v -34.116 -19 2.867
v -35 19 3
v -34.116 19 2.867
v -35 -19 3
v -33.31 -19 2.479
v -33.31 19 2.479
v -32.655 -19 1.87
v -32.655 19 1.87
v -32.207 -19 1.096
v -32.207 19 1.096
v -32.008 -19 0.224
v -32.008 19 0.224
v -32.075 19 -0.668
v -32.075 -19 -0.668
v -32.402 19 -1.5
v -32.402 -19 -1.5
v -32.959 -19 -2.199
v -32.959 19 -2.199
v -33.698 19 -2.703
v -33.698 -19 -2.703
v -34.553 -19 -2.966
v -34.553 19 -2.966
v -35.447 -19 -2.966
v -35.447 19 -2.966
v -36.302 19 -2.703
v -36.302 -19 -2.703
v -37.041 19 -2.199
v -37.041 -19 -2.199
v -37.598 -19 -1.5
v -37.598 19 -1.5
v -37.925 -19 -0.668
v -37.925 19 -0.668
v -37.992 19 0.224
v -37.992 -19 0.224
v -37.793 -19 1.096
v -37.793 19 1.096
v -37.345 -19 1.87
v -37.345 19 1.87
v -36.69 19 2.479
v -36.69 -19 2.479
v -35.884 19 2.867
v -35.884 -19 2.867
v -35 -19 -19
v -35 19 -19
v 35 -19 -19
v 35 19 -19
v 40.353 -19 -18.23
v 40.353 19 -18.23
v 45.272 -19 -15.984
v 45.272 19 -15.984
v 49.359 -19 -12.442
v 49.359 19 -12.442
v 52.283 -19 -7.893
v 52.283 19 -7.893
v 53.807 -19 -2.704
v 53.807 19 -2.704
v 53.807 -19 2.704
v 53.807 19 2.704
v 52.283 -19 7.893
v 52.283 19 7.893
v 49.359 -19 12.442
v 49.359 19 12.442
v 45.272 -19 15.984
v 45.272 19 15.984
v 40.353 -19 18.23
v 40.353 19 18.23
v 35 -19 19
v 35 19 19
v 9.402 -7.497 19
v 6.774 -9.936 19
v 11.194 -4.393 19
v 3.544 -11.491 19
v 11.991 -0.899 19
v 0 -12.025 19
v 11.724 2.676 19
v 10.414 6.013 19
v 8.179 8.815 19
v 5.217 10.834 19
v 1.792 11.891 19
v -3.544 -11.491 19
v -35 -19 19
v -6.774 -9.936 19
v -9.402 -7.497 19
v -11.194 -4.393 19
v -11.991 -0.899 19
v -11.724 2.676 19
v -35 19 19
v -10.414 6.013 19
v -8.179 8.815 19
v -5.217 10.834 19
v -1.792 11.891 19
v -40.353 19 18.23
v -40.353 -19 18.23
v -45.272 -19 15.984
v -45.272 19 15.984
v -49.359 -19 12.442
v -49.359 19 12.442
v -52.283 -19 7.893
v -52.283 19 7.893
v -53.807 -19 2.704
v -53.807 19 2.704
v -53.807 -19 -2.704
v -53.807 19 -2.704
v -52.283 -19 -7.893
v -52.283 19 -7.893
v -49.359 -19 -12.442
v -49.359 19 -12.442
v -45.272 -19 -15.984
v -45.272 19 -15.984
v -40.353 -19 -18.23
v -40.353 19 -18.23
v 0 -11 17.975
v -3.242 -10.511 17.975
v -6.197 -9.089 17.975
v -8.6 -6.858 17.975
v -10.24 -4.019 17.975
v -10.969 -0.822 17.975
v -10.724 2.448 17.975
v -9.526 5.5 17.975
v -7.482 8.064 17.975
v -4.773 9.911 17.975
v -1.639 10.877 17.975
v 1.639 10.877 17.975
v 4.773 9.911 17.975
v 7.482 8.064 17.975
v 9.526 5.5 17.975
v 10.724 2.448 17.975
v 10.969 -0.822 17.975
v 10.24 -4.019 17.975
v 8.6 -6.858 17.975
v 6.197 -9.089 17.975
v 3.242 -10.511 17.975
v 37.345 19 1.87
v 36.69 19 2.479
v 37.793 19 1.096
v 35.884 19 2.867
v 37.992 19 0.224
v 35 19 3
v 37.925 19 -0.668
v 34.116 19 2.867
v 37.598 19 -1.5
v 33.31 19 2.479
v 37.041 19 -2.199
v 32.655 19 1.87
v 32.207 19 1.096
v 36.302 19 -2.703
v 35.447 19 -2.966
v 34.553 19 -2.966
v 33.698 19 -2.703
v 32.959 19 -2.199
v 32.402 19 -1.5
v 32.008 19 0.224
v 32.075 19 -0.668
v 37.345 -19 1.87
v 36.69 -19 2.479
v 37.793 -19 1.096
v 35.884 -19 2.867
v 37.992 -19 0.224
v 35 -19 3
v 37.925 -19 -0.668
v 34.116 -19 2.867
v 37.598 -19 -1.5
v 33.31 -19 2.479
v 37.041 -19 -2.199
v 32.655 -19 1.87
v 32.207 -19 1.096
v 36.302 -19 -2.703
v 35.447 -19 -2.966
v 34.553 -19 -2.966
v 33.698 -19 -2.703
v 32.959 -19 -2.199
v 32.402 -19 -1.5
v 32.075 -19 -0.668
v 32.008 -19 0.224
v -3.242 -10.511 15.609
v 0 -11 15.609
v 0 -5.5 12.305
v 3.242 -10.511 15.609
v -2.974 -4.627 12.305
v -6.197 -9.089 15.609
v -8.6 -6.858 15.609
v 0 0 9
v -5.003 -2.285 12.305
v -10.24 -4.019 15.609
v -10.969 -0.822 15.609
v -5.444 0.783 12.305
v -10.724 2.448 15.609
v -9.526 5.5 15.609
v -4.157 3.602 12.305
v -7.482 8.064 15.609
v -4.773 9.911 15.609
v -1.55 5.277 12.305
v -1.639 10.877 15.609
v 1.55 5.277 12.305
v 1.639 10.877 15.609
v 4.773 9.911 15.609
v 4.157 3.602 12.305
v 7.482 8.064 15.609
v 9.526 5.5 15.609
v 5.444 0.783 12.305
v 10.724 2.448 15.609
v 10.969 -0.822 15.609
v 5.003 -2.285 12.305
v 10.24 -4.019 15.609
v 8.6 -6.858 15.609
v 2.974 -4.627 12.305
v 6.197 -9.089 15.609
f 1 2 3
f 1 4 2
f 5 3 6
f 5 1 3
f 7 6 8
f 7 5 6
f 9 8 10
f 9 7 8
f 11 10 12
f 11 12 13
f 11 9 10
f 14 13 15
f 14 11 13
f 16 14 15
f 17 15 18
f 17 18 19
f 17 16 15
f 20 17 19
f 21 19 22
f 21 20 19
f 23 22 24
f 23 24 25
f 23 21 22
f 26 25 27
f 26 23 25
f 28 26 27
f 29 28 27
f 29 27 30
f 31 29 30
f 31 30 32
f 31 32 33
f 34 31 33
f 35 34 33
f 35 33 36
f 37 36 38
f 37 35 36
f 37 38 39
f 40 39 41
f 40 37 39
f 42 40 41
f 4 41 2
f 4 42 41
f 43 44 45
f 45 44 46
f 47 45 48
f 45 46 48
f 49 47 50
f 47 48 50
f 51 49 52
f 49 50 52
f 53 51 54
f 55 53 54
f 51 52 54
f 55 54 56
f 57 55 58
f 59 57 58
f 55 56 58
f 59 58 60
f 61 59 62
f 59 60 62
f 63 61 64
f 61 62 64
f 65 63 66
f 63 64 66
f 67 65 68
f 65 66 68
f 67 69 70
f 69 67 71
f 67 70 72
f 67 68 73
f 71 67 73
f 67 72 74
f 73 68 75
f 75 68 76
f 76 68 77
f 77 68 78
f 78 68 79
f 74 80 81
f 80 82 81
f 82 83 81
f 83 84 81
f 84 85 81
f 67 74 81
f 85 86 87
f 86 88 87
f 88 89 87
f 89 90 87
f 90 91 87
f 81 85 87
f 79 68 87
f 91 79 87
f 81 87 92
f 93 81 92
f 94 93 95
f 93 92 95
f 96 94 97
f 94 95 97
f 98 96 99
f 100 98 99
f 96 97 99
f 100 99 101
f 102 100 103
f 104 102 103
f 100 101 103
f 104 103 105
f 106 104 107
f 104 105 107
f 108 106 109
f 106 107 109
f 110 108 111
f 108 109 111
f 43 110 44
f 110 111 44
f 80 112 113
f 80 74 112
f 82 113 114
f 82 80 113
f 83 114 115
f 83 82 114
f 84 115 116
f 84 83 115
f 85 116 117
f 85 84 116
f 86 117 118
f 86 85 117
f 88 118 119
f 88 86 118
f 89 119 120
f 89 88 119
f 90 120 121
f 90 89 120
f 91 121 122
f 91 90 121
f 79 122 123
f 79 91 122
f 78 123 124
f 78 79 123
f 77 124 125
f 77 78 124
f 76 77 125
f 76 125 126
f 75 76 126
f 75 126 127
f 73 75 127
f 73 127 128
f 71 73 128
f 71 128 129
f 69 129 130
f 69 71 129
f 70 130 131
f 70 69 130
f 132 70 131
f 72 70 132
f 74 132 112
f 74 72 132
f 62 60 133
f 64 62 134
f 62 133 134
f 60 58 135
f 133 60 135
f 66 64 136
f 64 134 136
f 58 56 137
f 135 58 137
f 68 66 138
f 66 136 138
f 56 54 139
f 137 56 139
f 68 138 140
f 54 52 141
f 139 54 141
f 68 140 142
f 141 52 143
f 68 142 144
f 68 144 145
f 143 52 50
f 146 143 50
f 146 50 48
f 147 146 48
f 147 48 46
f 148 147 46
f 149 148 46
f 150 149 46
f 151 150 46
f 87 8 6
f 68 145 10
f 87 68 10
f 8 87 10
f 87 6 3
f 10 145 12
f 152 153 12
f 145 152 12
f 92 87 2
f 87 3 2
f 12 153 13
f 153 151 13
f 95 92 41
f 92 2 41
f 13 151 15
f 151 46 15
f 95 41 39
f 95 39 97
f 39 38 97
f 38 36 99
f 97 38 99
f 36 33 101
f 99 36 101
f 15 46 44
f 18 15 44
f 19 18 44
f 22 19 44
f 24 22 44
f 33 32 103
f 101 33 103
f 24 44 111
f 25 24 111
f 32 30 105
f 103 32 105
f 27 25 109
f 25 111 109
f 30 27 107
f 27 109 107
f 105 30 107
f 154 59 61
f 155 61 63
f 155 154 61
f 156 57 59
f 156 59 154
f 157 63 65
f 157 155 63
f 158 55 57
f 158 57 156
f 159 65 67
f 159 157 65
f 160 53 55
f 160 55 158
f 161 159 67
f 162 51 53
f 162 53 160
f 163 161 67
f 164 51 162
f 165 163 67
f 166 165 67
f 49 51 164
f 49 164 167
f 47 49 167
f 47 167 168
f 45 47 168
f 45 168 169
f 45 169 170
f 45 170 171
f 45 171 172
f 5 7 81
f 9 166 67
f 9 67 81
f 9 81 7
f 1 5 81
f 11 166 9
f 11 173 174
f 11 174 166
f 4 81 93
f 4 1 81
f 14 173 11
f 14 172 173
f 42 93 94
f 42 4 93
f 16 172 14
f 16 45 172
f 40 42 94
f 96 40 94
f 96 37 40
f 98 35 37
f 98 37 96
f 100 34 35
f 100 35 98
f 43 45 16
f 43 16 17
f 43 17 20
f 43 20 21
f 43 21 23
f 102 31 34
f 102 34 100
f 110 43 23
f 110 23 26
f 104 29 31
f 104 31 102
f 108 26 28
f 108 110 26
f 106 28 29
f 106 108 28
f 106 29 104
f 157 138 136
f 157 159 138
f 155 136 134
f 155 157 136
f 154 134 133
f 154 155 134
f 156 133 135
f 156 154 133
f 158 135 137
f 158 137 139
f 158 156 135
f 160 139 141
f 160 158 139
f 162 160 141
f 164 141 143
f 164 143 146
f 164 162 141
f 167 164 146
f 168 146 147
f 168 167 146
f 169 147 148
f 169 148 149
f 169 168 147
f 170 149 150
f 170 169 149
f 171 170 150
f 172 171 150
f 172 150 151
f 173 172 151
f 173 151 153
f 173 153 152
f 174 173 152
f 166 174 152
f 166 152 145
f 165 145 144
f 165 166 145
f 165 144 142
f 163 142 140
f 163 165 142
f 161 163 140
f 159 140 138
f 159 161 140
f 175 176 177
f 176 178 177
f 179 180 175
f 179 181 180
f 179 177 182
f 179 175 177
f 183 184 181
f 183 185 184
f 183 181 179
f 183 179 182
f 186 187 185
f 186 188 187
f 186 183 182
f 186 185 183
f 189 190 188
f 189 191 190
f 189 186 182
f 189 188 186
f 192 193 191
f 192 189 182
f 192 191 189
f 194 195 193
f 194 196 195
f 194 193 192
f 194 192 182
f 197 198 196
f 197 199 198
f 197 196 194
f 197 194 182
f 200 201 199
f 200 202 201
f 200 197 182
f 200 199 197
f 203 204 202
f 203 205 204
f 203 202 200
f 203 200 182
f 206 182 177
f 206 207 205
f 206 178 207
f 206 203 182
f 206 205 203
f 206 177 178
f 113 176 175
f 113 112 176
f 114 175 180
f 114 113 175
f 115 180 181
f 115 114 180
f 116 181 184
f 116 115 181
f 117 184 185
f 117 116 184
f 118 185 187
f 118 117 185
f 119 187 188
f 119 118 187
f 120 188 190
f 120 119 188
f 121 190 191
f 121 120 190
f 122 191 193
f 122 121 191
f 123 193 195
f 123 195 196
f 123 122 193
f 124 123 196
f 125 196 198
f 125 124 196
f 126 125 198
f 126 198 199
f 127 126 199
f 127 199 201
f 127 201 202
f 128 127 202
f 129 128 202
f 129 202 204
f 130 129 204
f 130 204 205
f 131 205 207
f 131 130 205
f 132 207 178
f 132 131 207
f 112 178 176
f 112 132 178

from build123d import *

# Parameters (mm, degrees)
SKETCH1_R           = 3
BOSS_EXTRUDE1_DEPTH = 19


with BuildPart() as part:
    # Sketch1 → Boss-Extrude1 (new, symmetric)
    with BuildSketch(Plane(origin=(0, 0, 0), x_dir=(1, 0, 0), z_dir=(0, 1, 0))):
        with BuildLine():
            Line((-35, 19), (35, 19))
            ThreePointArc((35, 19), (54, 0), (35, -19))
            Line((35, -19), (-35, -19))
            ThreePointArc((-35, -19), (-54, 0), (-35, 19))
        make_face()
        with Locations(Location((-35, 0, 0), (0, 0, 270))):
            Circle(SKETCH1_R, mode=Mode.SUBTRACT)
        with Locations(Location((35, 0, 0), (0, 0, 270))):
            Circle(SKETCH1_R, mode=Mode.SUBTRACT)
    extrude(amount=BOSS_EXTRUDE1_DEPTH, both=True)

    # Sketch3 → M24x2.0 Tapped Hole1 (revolve, cut)
    with BuildSketch(Plane(origin=(0, 0, 19), x_dir=(0, -1, 0), z_dir=(1, 0, 0))):
        Polygon((0, 0), (0, 10), (11, 3.390533191), (11, 1.025), (12.025, 0), align=None)
    revolve(axis=Axis((0, 0, 25.35), (0, 0, -1)), mode=Mode.SUBTRACT)


solid = part.part
